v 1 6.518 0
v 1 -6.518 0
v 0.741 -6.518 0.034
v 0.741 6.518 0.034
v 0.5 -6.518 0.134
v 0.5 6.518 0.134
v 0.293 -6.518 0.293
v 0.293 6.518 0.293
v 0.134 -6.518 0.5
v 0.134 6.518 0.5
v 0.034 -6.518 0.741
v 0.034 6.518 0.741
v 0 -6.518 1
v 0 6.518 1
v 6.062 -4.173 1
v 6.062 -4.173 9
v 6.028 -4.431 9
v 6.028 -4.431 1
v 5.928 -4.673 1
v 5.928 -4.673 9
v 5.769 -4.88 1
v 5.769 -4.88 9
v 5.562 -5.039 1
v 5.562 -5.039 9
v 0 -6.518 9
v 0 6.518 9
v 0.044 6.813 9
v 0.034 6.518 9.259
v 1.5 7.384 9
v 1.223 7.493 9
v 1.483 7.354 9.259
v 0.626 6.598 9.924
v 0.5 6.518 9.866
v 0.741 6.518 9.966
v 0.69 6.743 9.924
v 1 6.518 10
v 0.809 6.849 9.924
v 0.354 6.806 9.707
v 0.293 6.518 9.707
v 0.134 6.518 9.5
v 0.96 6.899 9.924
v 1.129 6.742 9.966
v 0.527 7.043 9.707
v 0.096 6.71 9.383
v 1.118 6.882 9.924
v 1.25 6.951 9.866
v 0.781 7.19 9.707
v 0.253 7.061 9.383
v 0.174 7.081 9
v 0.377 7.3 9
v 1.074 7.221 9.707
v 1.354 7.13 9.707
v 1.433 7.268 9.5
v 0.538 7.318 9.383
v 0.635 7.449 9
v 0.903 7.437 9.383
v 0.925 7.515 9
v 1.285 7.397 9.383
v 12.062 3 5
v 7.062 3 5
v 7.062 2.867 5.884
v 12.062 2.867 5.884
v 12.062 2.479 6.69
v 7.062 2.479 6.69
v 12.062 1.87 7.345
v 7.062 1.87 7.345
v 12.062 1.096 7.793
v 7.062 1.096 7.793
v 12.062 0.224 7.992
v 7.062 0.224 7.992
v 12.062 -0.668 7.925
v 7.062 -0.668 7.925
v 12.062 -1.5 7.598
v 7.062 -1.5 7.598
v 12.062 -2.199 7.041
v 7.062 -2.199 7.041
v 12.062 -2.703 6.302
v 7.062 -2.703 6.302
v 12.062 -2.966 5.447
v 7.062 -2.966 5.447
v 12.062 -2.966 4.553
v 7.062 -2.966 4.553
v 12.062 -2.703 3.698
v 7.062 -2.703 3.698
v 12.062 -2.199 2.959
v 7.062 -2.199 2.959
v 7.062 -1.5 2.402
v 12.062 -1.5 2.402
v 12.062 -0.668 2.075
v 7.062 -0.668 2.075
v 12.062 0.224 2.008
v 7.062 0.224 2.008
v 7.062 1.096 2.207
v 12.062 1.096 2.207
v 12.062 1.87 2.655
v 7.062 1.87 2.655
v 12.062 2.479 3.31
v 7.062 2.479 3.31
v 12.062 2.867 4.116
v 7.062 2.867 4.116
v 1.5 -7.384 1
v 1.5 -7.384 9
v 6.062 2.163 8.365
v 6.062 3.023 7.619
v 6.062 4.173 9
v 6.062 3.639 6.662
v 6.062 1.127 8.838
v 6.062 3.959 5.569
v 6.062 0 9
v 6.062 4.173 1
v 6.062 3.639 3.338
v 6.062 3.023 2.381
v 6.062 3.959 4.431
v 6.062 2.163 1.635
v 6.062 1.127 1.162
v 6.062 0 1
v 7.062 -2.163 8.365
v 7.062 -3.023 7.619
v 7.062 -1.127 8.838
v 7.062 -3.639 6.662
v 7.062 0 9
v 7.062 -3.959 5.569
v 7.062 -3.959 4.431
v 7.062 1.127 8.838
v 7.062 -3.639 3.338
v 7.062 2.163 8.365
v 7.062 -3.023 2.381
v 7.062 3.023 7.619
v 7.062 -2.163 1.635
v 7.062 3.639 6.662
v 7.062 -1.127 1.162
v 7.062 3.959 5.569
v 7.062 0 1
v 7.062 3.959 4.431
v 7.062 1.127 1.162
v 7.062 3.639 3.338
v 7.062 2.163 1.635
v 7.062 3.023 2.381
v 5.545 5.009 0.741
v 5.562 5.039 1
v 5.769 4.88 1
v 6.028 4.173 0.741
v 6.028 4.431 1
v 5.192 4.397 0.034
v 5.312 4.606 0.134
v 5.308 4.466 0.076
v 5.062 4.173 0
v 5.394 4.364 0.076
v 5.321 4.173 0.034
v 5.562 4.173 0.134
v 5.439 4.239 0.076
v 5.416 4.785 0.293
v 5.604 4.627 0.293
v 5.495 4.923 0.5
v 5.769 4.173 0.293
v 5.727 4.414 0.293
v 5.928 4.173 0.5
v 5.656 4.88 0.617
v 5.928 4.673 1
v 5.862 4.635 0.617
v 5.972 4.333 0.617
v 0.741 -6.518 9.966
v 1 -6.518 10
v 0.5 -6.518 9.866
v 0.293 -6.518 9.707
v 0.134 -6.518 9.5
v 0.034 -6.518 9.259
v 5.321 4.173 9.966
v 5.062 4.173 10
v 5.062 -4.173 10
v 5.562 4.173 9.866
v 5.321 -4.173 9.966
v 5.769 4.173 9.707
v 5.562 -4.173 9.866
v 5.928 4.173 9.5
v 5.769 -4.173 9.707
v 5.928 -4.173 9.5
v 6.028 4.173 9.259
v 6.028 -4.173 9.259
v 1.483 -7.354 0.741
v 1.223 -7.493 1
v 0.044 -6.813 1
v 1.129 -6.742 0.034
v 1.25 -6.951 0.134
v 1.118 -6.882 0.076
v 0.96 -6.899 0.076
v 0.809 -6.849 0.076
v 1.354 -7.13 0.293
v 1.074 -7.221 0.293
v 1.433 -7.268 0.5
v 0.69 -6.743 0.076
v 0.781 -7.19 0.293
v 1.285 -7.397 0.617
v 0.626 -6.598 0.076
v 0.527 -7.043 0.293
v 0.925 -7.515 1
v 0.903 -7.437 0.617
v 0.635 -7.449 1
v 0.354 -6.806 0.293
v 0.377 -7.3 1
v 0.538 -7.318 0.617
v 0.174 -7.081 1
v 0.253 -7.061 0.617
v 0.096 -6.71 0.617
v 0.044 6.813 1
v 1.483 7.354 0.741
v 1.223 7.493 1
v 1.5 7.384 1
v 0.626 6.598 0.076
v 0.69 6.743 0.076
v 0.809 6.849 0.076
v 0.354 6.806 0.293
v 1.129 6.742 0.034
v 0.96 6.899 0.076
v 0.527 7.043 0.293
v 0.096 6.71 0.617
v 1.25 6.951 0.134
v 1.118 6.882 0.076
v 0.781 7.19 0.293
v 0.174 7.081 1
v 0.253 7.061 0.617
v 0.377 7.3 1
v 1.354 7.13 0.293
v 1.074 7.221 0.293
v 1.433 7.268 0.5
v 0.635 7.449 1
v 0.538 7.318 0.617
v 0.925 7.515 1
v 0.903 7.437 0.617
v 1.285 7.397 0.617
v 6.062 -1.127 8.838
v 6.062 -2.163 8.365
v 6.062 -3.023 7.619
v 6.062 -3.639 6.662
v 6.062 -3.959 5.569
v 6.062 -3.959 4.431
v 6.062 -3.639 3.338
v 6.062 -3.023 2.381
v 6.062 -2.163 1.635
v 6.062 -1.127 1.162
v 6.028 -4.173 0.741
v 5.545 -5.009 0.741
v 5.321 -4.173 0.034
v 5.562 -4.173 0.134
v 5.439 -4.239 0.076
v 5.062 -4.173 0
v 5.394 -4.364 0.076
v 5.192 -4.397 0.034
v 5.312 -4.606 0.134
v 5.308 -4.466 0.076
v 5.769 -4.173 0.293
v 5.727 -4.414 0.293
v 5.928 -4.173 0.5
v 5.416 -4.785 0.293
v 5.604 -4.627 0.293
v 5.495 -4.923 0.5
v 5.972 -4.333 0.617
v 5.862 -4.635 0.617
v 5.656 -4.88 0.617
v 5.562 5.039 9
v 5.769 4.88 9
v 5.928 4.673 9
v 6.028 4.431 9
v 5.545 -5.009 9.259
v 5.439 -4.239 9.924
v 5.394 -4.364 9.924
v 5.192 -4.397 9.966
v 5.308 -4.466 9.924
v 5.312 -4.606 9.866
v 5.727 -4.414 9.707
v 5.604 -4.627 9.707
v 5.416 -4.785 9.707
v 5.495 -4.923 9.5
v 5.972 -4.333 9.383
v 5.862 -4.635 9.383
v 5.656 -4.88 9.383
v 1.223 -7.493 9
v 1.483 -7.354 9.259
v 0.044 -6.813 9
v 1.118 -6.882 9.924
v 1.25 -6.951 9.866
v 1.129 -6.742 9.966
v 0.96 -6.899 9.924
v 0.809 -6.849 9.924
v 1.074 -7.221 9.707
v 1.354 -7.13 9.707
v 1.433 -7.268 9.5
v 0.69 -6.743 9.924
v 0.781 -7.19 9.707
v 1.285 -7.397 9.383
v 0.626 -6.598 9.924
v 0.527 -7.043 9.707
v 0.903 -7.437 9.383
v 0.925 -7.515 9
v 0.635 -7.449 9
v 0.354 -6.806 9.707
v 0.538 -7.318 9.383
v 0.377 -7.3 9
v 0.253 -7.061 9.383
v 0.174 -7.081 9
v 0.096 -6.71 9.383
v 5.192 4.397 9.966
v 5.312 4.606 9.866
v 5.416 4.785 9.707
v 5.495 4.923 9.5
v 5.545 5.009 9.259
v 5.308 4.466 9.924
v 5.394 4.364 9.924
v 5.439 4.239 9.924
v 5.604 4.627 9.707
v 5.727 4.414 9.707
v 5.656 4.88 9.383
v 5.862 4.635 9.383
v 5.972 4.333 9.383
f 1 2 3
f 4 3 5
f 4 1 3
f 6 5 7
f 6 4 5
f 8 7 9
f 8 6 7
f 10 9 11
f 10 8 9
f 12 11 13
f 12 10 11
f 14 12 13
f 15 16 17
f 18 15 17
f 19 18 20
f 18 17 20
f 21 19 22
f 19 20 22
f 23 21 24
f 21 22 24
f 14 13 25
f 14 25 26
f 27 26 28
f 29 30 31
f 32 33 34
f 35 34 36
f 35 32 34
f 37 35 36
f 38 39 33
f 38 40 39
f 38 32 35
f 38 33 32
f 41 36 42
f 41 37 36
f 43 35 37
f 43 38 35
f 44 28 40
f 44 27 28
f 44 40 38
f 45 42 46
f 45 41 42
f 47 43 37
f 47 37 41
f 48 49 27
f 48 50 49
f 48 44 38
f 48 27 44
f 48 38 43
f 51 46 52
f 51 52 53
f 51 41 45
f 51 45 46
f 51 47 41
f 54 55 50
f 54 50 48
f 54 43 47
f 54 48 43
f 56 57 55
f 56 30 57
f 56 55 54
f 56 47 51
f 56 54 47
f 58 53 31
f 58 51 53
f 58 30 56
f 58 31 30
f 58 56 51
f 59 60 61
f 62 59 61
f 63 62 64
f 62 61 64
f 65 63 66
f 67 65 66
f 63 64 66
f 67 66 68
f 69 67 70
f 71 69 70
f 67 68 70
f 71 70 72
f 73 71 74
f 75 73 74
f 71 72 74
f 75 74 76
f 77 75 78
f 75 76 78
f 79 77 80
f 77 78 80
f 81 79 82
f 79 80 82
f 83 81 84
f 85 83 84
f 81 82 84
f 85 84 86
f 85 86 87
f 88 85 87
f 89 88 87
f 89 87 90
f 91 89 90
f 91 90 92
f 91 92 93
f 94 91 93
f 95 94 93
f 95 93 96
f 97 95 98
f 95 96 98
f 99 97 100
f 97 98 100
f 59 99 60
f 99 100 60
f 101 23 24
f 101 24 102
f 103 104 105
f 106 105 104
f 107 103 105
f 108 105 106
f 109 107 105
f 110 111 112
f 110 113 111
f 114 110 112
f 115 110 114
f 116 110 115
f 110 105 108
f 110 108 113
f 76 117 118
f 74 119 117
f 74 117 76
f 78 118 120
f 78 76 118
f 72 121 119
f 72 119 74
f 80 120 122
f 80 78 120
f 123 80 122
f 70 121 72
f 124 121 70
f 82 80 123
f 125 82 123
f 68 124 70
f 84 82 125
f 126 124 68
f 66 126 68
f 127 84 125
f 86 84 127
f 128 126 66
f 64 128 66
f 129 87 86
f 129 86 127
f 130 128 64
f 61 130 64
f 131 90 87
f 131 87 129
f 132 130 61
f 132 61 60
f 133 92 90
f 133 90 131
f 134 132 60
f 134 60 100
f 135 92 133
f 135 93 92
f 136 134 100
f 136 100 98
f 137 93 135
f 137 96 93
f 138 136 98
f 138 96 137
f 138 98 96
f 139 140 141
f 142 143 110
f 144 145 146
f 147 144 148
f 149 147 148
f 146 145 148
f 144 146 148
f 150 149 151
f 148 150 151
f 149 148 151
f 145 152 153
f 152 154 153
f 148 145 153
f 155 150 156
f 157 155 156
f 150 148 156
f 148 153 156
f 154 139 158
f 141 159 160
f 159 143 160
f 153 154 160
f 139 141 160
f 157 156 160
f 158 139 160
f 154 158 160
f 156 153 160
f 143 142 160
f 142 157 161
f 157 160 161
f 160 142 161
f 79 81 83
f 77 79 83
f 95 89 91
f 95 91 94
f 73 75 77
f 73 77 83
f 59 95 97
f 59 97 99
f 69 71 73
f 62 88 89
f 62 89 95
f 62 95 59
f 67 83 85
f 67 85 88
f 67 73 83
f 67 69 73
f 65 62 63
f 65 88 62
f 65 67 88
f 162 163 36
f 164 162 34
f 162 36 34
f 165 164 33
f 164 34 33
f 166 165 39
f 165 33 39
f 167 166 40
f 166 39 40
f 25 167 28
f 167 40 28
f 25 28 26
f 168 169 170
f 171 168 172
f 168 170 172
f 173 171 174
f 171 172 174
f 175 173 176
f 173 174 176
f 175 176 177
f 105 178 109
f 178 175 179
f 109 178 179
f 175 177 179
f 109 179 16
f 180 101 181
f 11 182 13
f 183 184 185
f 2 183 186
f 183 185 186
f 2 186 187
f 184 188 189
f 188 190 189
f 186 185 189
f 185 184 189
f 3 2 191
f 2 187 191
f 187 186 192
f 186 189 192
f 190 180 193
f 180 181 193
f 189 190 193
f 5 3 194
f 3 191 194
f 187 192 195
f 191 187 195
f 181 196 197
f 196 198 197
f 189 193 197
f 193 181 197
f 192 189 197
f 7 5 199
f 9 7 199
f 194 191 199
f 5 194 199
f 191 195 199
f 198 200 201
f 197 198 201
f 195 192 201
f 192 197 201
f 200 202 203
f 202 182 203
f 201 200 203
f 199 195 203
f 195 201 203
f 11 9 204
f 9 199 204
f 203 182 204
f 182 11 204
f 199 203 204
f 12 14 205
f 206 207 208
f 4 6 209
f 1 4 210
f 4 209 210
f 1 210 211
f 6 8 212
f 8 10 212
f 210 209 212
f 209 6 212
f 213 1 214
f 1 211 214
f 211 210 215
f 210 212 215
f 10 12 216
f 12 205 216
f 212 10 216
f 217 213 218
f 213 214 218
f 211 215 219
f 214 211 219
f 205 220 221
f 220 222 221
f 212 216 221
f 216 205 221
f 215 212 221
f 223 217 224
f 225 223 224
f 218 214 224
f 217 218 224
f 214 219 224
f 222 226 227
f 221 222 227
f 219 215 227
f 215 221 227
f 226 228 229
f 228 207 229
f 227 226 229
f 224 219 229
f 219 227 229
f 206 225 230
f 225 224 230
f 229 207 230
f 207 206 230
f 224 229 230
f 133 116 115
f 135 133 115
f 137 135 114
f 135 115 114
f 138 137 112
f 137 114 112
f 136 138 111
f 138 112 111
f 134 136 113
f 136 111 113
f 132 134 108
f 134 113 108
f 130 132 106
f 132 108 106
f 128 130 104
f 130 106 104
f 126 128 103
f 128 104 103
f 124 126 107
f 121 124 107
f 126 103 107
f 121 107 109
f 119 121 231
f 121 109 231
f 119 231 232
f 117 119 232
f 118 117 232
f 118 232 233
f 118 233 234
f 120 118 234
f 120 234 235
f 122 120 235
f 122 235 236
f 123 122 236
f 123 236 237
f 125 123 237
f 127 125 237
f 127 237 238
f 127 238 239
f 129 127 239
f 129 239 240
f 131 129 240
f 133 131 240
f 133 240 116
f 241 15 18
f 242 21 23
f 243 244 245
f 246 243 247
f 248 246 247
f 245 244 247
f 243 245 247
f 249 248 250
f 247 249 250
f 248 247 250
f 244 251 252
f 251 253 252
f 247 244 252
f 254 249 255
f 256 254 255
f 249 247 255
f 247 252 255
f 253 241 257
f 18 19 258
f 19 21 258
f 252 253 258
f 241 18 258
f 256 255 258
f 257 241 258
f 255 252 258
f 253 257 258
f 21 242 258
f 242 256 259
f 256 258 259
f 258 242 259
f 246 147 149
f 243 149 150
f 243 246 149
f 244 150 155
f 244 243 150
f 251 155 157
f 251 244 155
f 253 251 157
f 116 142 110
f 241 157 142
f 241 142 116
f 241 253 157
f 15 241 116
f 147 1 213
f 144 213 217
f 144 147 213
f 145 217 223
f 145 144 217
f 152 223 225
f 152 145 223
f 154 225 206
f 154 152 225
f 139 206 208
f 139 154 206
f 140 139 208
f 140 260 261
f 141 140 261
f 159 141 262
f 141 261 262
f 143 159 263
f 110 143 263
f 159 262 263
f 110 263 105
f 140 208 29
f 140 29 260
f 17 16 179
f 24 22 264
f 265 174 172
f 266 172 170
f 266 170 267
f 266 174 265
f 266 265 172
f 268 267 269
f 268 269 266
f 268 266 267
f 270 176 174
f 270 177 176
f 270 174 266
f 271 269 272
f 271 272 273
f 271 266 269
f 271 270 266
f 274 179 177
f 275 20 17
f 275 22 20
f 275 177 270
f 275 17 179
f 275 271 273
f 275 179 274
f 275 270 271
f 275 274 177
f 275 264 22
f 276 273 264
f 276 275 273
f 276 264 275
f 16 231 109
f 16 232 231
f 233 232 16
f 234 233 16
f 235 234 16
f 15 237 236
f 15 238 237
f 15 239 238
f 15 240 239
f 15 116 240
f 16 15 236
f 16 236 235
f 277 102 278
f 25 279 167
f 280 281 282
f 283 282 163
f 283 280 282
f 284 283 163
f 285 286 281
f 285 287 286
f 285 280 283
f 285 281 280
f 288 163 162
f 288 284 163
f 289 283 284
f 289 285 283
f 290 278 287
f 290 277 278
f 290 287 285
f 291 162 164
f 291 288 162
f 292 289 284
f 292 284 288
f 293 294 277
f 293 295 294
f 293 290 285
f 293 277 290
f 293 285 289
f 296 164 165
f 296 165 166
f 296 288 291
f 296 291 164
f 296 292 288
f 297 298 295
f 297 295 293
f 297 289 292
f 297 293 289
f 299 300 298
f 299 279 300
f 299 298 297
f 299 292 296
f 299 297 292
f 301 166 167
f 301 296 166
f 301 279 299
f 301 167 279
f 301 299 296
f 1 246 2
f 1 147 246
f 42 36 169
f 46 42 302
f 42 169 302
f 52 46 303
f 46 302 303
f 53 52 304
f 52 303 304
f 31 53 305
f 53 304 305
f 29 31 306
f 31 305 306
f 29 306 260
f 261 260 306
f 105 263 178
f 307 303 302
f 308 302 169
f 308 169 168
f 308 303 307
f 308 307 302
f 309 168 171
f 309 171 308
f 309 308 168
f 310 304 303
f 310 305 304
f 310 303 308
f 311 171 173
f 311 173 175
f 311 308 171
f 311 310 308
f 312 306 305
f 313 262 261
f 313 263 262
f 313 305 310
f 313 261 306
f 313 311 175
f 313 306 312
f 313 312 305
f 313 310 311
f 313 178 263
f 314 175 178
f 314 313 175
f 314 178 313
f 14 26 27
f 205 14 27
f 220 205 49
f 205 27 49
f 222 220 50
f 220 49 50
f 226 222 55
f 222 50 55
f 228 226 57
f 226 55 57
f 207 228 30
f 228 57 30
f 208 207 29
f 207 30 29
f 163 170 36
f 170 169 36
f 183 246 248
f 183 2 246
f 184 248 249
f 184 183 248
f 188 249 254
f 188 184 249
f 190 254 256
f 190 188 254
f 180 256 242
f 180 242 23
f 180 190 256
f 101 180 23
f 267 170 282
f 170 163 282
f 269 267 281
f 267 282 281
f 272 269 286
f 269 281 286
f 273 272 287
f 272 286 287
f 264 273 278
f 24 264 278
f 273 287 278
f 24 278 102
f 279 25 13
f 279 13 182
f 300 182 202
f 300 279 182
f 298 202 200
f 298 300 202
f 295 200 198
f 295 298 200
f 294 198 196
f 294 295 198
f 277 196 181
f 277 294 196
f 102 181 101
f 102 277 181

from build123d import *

# Parameters (mm, degrees)
Y_KSEKLIK_EKSTR_ZYON1_DEPTH = 10
RADYUS1_R                   = 1
RADYUS2_R                   = 1
IZIM2_R                     = 4
Y_KSEKLIK_EKSTR_ZYON2_DEPTH = 1
IZIM3_R                     = 3
Y_KSEKLIK_EKSTR_ZYON3_DEPTH = 5


with BuildPart() as part:
    # Çizim1 → Yükseklik-Ekstrüzyon1 (new body)
    with BuildSketch(Plane.XY):
        Polygon((0, -8.25), (0, 8.25), (6.062177826, 4.75), (6.062177826, -4.75), align=None)
    extrude(amount=Y_KSEKLIK_EKSTR_ZYON1_DEPTH)

    # Radyus1
    radyus1_edges = [part.edges().sort_by_distance(p)[0] for p in [
        (0, -8.25, 5),
        (0, 8.25, 5),
        (6.062177826, 4.75, 5),
        (6.062177826, -4.75, 5),
    ]]
    fillet(radyus1_edges, radius=RADYUS1_R)

    # Radyus2
    radyus2_edges = [part.edges().sort_by_distance(p)[0] for p in [
        (3.531088913, -6.211324865, 0),
        (3.531088913, -6.211324865, 10),
        (0, 0, 0),
        (3.531088913, 6.211324865, 0),
        (6.062177826, 0, 0),
        (0.5, 7.383974596, 0),
        (5.92820323, 4.672649731, 0),
        (5.92820323, -4.672649731, 0),
        (0.5, -7.383974596, 0),
        (0, 0, 10),
        (6.062177826, 0, 10),
        (3.531088913, 6.211324865, 10),
        (0.5, 7.383974596, 10),
        (5.92820323, 4.672649731, 10),
        (5.92820323, -4.672649731, 10),
        (0.5, -7.383974596, 10),
    ]]
    fillet(radyus2_edges, radius=RADYUS2_R)

    # Çizim2 → Yükseklik-Ekstrüzyon2 (add)
    with BuildSketch(Plane(origin=(6.062177826, 0, 0), x_dir=(0, 0, -1), z_dir=(1, 0, 0))):
        with Locations((-5, 0)):
            Circle(IZIM2_R)
    extrude(amount=Y_KSEKLIK_EKSTR_ZYON2_DEPTH)

    # Çizim3 → Yükseklik-Ekstrüzyon3 (add)
    with BuildSketch(Plane(origin=(7.062177826, 0, 0), x_dir=(0, 0, -1), z_dir=(1, 0, 0))):
        with Locations(Location((-5, 0, 0), (0, 0, 90))):
            Circle(IZIM3_R)
    extrude(amount=Y_KSEKLIK_EKSTR_ZYON3_DEPTH)


solid = part.part
